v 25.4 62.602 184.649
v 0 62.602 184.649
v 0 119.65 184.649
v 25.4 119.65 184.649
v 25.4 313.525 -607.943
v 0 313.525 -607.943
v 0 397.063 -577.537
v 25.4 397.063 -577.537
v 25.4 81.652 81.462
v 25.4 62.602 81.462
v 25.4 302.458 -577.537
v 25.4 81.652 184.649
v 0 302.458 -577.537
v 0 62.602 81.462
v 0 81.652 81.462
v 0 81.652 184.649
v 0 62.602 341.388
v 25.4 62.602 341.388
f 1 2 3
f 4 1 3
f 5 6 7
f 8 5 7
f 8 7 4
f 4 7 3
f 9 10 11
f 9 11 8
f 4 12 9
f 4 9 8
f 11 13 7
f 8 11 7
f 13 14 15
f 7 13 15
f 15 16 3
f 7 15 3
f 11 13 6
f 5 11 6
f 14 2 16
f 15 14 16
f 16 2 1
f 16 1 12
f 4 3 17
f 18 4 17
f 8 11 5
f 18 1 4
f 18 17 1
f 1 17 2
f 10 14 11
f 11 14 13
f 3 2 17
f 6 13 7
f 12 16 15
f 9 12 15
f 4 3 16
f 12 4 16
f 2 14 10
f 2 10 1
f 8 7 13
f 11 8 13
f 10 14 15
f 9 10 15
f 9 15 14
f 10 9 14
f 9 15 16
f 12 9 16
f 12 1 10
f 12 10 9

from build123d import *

# Parameters (mm, degrees)
F1_DEPTH = 25.4
F2_DEPTH = 25.4
F0_W     = 19.05
F0_H     = 103.1875
F3_DEPTH = 25.4
F4_DEPTH = 25.4


with BuildPart() as f1:
    # F0 (on Right) → F1 (new body)
    with BuildSketch(Plane.YZ):
        Polygon((62.601827, 341.388148), (62.601827, 184.649437), (81.651827, 184.649437), (119.650053, 184.649437), align=None)
    extrude(amount=F1_DEPTH)


with BuildPart() as f2:
    # F0 (on Right) → F2 (new body)
    with BuildSketch(Plane.YZ):
        Polygon((81.651827, 81.461937), (62.601827, 81.461937), (302.457922, -577.537266), (397.063326, -577.537266), (119.650053, 184.649437), (81.651827, 184.649437), align=None)
    extrude(amount=F2_DEPTH)


with BuildPart() as f3:
    # F0 (on Right) → F3 (new body)
    with BuildSketch(Plane.YZ):
        with Locations((72.126827, 133.055687)):
            Rectangle(F0_W, F0_H)
    extrude(amount=F3_DEPTH)


with BuildPart() as f4:
    # F0 (on Right) → F4 (new body)
    with BuildSketch(Plane.YZ):
        Polygon((397.063326, -577.537266), (302.457922, -577.537266), (313.524652, -607.942857), align=None)
    extrude(amount=F4_DEPTH)


solid = Compound([f1.part, f2.part, f3.part, f4.part])
